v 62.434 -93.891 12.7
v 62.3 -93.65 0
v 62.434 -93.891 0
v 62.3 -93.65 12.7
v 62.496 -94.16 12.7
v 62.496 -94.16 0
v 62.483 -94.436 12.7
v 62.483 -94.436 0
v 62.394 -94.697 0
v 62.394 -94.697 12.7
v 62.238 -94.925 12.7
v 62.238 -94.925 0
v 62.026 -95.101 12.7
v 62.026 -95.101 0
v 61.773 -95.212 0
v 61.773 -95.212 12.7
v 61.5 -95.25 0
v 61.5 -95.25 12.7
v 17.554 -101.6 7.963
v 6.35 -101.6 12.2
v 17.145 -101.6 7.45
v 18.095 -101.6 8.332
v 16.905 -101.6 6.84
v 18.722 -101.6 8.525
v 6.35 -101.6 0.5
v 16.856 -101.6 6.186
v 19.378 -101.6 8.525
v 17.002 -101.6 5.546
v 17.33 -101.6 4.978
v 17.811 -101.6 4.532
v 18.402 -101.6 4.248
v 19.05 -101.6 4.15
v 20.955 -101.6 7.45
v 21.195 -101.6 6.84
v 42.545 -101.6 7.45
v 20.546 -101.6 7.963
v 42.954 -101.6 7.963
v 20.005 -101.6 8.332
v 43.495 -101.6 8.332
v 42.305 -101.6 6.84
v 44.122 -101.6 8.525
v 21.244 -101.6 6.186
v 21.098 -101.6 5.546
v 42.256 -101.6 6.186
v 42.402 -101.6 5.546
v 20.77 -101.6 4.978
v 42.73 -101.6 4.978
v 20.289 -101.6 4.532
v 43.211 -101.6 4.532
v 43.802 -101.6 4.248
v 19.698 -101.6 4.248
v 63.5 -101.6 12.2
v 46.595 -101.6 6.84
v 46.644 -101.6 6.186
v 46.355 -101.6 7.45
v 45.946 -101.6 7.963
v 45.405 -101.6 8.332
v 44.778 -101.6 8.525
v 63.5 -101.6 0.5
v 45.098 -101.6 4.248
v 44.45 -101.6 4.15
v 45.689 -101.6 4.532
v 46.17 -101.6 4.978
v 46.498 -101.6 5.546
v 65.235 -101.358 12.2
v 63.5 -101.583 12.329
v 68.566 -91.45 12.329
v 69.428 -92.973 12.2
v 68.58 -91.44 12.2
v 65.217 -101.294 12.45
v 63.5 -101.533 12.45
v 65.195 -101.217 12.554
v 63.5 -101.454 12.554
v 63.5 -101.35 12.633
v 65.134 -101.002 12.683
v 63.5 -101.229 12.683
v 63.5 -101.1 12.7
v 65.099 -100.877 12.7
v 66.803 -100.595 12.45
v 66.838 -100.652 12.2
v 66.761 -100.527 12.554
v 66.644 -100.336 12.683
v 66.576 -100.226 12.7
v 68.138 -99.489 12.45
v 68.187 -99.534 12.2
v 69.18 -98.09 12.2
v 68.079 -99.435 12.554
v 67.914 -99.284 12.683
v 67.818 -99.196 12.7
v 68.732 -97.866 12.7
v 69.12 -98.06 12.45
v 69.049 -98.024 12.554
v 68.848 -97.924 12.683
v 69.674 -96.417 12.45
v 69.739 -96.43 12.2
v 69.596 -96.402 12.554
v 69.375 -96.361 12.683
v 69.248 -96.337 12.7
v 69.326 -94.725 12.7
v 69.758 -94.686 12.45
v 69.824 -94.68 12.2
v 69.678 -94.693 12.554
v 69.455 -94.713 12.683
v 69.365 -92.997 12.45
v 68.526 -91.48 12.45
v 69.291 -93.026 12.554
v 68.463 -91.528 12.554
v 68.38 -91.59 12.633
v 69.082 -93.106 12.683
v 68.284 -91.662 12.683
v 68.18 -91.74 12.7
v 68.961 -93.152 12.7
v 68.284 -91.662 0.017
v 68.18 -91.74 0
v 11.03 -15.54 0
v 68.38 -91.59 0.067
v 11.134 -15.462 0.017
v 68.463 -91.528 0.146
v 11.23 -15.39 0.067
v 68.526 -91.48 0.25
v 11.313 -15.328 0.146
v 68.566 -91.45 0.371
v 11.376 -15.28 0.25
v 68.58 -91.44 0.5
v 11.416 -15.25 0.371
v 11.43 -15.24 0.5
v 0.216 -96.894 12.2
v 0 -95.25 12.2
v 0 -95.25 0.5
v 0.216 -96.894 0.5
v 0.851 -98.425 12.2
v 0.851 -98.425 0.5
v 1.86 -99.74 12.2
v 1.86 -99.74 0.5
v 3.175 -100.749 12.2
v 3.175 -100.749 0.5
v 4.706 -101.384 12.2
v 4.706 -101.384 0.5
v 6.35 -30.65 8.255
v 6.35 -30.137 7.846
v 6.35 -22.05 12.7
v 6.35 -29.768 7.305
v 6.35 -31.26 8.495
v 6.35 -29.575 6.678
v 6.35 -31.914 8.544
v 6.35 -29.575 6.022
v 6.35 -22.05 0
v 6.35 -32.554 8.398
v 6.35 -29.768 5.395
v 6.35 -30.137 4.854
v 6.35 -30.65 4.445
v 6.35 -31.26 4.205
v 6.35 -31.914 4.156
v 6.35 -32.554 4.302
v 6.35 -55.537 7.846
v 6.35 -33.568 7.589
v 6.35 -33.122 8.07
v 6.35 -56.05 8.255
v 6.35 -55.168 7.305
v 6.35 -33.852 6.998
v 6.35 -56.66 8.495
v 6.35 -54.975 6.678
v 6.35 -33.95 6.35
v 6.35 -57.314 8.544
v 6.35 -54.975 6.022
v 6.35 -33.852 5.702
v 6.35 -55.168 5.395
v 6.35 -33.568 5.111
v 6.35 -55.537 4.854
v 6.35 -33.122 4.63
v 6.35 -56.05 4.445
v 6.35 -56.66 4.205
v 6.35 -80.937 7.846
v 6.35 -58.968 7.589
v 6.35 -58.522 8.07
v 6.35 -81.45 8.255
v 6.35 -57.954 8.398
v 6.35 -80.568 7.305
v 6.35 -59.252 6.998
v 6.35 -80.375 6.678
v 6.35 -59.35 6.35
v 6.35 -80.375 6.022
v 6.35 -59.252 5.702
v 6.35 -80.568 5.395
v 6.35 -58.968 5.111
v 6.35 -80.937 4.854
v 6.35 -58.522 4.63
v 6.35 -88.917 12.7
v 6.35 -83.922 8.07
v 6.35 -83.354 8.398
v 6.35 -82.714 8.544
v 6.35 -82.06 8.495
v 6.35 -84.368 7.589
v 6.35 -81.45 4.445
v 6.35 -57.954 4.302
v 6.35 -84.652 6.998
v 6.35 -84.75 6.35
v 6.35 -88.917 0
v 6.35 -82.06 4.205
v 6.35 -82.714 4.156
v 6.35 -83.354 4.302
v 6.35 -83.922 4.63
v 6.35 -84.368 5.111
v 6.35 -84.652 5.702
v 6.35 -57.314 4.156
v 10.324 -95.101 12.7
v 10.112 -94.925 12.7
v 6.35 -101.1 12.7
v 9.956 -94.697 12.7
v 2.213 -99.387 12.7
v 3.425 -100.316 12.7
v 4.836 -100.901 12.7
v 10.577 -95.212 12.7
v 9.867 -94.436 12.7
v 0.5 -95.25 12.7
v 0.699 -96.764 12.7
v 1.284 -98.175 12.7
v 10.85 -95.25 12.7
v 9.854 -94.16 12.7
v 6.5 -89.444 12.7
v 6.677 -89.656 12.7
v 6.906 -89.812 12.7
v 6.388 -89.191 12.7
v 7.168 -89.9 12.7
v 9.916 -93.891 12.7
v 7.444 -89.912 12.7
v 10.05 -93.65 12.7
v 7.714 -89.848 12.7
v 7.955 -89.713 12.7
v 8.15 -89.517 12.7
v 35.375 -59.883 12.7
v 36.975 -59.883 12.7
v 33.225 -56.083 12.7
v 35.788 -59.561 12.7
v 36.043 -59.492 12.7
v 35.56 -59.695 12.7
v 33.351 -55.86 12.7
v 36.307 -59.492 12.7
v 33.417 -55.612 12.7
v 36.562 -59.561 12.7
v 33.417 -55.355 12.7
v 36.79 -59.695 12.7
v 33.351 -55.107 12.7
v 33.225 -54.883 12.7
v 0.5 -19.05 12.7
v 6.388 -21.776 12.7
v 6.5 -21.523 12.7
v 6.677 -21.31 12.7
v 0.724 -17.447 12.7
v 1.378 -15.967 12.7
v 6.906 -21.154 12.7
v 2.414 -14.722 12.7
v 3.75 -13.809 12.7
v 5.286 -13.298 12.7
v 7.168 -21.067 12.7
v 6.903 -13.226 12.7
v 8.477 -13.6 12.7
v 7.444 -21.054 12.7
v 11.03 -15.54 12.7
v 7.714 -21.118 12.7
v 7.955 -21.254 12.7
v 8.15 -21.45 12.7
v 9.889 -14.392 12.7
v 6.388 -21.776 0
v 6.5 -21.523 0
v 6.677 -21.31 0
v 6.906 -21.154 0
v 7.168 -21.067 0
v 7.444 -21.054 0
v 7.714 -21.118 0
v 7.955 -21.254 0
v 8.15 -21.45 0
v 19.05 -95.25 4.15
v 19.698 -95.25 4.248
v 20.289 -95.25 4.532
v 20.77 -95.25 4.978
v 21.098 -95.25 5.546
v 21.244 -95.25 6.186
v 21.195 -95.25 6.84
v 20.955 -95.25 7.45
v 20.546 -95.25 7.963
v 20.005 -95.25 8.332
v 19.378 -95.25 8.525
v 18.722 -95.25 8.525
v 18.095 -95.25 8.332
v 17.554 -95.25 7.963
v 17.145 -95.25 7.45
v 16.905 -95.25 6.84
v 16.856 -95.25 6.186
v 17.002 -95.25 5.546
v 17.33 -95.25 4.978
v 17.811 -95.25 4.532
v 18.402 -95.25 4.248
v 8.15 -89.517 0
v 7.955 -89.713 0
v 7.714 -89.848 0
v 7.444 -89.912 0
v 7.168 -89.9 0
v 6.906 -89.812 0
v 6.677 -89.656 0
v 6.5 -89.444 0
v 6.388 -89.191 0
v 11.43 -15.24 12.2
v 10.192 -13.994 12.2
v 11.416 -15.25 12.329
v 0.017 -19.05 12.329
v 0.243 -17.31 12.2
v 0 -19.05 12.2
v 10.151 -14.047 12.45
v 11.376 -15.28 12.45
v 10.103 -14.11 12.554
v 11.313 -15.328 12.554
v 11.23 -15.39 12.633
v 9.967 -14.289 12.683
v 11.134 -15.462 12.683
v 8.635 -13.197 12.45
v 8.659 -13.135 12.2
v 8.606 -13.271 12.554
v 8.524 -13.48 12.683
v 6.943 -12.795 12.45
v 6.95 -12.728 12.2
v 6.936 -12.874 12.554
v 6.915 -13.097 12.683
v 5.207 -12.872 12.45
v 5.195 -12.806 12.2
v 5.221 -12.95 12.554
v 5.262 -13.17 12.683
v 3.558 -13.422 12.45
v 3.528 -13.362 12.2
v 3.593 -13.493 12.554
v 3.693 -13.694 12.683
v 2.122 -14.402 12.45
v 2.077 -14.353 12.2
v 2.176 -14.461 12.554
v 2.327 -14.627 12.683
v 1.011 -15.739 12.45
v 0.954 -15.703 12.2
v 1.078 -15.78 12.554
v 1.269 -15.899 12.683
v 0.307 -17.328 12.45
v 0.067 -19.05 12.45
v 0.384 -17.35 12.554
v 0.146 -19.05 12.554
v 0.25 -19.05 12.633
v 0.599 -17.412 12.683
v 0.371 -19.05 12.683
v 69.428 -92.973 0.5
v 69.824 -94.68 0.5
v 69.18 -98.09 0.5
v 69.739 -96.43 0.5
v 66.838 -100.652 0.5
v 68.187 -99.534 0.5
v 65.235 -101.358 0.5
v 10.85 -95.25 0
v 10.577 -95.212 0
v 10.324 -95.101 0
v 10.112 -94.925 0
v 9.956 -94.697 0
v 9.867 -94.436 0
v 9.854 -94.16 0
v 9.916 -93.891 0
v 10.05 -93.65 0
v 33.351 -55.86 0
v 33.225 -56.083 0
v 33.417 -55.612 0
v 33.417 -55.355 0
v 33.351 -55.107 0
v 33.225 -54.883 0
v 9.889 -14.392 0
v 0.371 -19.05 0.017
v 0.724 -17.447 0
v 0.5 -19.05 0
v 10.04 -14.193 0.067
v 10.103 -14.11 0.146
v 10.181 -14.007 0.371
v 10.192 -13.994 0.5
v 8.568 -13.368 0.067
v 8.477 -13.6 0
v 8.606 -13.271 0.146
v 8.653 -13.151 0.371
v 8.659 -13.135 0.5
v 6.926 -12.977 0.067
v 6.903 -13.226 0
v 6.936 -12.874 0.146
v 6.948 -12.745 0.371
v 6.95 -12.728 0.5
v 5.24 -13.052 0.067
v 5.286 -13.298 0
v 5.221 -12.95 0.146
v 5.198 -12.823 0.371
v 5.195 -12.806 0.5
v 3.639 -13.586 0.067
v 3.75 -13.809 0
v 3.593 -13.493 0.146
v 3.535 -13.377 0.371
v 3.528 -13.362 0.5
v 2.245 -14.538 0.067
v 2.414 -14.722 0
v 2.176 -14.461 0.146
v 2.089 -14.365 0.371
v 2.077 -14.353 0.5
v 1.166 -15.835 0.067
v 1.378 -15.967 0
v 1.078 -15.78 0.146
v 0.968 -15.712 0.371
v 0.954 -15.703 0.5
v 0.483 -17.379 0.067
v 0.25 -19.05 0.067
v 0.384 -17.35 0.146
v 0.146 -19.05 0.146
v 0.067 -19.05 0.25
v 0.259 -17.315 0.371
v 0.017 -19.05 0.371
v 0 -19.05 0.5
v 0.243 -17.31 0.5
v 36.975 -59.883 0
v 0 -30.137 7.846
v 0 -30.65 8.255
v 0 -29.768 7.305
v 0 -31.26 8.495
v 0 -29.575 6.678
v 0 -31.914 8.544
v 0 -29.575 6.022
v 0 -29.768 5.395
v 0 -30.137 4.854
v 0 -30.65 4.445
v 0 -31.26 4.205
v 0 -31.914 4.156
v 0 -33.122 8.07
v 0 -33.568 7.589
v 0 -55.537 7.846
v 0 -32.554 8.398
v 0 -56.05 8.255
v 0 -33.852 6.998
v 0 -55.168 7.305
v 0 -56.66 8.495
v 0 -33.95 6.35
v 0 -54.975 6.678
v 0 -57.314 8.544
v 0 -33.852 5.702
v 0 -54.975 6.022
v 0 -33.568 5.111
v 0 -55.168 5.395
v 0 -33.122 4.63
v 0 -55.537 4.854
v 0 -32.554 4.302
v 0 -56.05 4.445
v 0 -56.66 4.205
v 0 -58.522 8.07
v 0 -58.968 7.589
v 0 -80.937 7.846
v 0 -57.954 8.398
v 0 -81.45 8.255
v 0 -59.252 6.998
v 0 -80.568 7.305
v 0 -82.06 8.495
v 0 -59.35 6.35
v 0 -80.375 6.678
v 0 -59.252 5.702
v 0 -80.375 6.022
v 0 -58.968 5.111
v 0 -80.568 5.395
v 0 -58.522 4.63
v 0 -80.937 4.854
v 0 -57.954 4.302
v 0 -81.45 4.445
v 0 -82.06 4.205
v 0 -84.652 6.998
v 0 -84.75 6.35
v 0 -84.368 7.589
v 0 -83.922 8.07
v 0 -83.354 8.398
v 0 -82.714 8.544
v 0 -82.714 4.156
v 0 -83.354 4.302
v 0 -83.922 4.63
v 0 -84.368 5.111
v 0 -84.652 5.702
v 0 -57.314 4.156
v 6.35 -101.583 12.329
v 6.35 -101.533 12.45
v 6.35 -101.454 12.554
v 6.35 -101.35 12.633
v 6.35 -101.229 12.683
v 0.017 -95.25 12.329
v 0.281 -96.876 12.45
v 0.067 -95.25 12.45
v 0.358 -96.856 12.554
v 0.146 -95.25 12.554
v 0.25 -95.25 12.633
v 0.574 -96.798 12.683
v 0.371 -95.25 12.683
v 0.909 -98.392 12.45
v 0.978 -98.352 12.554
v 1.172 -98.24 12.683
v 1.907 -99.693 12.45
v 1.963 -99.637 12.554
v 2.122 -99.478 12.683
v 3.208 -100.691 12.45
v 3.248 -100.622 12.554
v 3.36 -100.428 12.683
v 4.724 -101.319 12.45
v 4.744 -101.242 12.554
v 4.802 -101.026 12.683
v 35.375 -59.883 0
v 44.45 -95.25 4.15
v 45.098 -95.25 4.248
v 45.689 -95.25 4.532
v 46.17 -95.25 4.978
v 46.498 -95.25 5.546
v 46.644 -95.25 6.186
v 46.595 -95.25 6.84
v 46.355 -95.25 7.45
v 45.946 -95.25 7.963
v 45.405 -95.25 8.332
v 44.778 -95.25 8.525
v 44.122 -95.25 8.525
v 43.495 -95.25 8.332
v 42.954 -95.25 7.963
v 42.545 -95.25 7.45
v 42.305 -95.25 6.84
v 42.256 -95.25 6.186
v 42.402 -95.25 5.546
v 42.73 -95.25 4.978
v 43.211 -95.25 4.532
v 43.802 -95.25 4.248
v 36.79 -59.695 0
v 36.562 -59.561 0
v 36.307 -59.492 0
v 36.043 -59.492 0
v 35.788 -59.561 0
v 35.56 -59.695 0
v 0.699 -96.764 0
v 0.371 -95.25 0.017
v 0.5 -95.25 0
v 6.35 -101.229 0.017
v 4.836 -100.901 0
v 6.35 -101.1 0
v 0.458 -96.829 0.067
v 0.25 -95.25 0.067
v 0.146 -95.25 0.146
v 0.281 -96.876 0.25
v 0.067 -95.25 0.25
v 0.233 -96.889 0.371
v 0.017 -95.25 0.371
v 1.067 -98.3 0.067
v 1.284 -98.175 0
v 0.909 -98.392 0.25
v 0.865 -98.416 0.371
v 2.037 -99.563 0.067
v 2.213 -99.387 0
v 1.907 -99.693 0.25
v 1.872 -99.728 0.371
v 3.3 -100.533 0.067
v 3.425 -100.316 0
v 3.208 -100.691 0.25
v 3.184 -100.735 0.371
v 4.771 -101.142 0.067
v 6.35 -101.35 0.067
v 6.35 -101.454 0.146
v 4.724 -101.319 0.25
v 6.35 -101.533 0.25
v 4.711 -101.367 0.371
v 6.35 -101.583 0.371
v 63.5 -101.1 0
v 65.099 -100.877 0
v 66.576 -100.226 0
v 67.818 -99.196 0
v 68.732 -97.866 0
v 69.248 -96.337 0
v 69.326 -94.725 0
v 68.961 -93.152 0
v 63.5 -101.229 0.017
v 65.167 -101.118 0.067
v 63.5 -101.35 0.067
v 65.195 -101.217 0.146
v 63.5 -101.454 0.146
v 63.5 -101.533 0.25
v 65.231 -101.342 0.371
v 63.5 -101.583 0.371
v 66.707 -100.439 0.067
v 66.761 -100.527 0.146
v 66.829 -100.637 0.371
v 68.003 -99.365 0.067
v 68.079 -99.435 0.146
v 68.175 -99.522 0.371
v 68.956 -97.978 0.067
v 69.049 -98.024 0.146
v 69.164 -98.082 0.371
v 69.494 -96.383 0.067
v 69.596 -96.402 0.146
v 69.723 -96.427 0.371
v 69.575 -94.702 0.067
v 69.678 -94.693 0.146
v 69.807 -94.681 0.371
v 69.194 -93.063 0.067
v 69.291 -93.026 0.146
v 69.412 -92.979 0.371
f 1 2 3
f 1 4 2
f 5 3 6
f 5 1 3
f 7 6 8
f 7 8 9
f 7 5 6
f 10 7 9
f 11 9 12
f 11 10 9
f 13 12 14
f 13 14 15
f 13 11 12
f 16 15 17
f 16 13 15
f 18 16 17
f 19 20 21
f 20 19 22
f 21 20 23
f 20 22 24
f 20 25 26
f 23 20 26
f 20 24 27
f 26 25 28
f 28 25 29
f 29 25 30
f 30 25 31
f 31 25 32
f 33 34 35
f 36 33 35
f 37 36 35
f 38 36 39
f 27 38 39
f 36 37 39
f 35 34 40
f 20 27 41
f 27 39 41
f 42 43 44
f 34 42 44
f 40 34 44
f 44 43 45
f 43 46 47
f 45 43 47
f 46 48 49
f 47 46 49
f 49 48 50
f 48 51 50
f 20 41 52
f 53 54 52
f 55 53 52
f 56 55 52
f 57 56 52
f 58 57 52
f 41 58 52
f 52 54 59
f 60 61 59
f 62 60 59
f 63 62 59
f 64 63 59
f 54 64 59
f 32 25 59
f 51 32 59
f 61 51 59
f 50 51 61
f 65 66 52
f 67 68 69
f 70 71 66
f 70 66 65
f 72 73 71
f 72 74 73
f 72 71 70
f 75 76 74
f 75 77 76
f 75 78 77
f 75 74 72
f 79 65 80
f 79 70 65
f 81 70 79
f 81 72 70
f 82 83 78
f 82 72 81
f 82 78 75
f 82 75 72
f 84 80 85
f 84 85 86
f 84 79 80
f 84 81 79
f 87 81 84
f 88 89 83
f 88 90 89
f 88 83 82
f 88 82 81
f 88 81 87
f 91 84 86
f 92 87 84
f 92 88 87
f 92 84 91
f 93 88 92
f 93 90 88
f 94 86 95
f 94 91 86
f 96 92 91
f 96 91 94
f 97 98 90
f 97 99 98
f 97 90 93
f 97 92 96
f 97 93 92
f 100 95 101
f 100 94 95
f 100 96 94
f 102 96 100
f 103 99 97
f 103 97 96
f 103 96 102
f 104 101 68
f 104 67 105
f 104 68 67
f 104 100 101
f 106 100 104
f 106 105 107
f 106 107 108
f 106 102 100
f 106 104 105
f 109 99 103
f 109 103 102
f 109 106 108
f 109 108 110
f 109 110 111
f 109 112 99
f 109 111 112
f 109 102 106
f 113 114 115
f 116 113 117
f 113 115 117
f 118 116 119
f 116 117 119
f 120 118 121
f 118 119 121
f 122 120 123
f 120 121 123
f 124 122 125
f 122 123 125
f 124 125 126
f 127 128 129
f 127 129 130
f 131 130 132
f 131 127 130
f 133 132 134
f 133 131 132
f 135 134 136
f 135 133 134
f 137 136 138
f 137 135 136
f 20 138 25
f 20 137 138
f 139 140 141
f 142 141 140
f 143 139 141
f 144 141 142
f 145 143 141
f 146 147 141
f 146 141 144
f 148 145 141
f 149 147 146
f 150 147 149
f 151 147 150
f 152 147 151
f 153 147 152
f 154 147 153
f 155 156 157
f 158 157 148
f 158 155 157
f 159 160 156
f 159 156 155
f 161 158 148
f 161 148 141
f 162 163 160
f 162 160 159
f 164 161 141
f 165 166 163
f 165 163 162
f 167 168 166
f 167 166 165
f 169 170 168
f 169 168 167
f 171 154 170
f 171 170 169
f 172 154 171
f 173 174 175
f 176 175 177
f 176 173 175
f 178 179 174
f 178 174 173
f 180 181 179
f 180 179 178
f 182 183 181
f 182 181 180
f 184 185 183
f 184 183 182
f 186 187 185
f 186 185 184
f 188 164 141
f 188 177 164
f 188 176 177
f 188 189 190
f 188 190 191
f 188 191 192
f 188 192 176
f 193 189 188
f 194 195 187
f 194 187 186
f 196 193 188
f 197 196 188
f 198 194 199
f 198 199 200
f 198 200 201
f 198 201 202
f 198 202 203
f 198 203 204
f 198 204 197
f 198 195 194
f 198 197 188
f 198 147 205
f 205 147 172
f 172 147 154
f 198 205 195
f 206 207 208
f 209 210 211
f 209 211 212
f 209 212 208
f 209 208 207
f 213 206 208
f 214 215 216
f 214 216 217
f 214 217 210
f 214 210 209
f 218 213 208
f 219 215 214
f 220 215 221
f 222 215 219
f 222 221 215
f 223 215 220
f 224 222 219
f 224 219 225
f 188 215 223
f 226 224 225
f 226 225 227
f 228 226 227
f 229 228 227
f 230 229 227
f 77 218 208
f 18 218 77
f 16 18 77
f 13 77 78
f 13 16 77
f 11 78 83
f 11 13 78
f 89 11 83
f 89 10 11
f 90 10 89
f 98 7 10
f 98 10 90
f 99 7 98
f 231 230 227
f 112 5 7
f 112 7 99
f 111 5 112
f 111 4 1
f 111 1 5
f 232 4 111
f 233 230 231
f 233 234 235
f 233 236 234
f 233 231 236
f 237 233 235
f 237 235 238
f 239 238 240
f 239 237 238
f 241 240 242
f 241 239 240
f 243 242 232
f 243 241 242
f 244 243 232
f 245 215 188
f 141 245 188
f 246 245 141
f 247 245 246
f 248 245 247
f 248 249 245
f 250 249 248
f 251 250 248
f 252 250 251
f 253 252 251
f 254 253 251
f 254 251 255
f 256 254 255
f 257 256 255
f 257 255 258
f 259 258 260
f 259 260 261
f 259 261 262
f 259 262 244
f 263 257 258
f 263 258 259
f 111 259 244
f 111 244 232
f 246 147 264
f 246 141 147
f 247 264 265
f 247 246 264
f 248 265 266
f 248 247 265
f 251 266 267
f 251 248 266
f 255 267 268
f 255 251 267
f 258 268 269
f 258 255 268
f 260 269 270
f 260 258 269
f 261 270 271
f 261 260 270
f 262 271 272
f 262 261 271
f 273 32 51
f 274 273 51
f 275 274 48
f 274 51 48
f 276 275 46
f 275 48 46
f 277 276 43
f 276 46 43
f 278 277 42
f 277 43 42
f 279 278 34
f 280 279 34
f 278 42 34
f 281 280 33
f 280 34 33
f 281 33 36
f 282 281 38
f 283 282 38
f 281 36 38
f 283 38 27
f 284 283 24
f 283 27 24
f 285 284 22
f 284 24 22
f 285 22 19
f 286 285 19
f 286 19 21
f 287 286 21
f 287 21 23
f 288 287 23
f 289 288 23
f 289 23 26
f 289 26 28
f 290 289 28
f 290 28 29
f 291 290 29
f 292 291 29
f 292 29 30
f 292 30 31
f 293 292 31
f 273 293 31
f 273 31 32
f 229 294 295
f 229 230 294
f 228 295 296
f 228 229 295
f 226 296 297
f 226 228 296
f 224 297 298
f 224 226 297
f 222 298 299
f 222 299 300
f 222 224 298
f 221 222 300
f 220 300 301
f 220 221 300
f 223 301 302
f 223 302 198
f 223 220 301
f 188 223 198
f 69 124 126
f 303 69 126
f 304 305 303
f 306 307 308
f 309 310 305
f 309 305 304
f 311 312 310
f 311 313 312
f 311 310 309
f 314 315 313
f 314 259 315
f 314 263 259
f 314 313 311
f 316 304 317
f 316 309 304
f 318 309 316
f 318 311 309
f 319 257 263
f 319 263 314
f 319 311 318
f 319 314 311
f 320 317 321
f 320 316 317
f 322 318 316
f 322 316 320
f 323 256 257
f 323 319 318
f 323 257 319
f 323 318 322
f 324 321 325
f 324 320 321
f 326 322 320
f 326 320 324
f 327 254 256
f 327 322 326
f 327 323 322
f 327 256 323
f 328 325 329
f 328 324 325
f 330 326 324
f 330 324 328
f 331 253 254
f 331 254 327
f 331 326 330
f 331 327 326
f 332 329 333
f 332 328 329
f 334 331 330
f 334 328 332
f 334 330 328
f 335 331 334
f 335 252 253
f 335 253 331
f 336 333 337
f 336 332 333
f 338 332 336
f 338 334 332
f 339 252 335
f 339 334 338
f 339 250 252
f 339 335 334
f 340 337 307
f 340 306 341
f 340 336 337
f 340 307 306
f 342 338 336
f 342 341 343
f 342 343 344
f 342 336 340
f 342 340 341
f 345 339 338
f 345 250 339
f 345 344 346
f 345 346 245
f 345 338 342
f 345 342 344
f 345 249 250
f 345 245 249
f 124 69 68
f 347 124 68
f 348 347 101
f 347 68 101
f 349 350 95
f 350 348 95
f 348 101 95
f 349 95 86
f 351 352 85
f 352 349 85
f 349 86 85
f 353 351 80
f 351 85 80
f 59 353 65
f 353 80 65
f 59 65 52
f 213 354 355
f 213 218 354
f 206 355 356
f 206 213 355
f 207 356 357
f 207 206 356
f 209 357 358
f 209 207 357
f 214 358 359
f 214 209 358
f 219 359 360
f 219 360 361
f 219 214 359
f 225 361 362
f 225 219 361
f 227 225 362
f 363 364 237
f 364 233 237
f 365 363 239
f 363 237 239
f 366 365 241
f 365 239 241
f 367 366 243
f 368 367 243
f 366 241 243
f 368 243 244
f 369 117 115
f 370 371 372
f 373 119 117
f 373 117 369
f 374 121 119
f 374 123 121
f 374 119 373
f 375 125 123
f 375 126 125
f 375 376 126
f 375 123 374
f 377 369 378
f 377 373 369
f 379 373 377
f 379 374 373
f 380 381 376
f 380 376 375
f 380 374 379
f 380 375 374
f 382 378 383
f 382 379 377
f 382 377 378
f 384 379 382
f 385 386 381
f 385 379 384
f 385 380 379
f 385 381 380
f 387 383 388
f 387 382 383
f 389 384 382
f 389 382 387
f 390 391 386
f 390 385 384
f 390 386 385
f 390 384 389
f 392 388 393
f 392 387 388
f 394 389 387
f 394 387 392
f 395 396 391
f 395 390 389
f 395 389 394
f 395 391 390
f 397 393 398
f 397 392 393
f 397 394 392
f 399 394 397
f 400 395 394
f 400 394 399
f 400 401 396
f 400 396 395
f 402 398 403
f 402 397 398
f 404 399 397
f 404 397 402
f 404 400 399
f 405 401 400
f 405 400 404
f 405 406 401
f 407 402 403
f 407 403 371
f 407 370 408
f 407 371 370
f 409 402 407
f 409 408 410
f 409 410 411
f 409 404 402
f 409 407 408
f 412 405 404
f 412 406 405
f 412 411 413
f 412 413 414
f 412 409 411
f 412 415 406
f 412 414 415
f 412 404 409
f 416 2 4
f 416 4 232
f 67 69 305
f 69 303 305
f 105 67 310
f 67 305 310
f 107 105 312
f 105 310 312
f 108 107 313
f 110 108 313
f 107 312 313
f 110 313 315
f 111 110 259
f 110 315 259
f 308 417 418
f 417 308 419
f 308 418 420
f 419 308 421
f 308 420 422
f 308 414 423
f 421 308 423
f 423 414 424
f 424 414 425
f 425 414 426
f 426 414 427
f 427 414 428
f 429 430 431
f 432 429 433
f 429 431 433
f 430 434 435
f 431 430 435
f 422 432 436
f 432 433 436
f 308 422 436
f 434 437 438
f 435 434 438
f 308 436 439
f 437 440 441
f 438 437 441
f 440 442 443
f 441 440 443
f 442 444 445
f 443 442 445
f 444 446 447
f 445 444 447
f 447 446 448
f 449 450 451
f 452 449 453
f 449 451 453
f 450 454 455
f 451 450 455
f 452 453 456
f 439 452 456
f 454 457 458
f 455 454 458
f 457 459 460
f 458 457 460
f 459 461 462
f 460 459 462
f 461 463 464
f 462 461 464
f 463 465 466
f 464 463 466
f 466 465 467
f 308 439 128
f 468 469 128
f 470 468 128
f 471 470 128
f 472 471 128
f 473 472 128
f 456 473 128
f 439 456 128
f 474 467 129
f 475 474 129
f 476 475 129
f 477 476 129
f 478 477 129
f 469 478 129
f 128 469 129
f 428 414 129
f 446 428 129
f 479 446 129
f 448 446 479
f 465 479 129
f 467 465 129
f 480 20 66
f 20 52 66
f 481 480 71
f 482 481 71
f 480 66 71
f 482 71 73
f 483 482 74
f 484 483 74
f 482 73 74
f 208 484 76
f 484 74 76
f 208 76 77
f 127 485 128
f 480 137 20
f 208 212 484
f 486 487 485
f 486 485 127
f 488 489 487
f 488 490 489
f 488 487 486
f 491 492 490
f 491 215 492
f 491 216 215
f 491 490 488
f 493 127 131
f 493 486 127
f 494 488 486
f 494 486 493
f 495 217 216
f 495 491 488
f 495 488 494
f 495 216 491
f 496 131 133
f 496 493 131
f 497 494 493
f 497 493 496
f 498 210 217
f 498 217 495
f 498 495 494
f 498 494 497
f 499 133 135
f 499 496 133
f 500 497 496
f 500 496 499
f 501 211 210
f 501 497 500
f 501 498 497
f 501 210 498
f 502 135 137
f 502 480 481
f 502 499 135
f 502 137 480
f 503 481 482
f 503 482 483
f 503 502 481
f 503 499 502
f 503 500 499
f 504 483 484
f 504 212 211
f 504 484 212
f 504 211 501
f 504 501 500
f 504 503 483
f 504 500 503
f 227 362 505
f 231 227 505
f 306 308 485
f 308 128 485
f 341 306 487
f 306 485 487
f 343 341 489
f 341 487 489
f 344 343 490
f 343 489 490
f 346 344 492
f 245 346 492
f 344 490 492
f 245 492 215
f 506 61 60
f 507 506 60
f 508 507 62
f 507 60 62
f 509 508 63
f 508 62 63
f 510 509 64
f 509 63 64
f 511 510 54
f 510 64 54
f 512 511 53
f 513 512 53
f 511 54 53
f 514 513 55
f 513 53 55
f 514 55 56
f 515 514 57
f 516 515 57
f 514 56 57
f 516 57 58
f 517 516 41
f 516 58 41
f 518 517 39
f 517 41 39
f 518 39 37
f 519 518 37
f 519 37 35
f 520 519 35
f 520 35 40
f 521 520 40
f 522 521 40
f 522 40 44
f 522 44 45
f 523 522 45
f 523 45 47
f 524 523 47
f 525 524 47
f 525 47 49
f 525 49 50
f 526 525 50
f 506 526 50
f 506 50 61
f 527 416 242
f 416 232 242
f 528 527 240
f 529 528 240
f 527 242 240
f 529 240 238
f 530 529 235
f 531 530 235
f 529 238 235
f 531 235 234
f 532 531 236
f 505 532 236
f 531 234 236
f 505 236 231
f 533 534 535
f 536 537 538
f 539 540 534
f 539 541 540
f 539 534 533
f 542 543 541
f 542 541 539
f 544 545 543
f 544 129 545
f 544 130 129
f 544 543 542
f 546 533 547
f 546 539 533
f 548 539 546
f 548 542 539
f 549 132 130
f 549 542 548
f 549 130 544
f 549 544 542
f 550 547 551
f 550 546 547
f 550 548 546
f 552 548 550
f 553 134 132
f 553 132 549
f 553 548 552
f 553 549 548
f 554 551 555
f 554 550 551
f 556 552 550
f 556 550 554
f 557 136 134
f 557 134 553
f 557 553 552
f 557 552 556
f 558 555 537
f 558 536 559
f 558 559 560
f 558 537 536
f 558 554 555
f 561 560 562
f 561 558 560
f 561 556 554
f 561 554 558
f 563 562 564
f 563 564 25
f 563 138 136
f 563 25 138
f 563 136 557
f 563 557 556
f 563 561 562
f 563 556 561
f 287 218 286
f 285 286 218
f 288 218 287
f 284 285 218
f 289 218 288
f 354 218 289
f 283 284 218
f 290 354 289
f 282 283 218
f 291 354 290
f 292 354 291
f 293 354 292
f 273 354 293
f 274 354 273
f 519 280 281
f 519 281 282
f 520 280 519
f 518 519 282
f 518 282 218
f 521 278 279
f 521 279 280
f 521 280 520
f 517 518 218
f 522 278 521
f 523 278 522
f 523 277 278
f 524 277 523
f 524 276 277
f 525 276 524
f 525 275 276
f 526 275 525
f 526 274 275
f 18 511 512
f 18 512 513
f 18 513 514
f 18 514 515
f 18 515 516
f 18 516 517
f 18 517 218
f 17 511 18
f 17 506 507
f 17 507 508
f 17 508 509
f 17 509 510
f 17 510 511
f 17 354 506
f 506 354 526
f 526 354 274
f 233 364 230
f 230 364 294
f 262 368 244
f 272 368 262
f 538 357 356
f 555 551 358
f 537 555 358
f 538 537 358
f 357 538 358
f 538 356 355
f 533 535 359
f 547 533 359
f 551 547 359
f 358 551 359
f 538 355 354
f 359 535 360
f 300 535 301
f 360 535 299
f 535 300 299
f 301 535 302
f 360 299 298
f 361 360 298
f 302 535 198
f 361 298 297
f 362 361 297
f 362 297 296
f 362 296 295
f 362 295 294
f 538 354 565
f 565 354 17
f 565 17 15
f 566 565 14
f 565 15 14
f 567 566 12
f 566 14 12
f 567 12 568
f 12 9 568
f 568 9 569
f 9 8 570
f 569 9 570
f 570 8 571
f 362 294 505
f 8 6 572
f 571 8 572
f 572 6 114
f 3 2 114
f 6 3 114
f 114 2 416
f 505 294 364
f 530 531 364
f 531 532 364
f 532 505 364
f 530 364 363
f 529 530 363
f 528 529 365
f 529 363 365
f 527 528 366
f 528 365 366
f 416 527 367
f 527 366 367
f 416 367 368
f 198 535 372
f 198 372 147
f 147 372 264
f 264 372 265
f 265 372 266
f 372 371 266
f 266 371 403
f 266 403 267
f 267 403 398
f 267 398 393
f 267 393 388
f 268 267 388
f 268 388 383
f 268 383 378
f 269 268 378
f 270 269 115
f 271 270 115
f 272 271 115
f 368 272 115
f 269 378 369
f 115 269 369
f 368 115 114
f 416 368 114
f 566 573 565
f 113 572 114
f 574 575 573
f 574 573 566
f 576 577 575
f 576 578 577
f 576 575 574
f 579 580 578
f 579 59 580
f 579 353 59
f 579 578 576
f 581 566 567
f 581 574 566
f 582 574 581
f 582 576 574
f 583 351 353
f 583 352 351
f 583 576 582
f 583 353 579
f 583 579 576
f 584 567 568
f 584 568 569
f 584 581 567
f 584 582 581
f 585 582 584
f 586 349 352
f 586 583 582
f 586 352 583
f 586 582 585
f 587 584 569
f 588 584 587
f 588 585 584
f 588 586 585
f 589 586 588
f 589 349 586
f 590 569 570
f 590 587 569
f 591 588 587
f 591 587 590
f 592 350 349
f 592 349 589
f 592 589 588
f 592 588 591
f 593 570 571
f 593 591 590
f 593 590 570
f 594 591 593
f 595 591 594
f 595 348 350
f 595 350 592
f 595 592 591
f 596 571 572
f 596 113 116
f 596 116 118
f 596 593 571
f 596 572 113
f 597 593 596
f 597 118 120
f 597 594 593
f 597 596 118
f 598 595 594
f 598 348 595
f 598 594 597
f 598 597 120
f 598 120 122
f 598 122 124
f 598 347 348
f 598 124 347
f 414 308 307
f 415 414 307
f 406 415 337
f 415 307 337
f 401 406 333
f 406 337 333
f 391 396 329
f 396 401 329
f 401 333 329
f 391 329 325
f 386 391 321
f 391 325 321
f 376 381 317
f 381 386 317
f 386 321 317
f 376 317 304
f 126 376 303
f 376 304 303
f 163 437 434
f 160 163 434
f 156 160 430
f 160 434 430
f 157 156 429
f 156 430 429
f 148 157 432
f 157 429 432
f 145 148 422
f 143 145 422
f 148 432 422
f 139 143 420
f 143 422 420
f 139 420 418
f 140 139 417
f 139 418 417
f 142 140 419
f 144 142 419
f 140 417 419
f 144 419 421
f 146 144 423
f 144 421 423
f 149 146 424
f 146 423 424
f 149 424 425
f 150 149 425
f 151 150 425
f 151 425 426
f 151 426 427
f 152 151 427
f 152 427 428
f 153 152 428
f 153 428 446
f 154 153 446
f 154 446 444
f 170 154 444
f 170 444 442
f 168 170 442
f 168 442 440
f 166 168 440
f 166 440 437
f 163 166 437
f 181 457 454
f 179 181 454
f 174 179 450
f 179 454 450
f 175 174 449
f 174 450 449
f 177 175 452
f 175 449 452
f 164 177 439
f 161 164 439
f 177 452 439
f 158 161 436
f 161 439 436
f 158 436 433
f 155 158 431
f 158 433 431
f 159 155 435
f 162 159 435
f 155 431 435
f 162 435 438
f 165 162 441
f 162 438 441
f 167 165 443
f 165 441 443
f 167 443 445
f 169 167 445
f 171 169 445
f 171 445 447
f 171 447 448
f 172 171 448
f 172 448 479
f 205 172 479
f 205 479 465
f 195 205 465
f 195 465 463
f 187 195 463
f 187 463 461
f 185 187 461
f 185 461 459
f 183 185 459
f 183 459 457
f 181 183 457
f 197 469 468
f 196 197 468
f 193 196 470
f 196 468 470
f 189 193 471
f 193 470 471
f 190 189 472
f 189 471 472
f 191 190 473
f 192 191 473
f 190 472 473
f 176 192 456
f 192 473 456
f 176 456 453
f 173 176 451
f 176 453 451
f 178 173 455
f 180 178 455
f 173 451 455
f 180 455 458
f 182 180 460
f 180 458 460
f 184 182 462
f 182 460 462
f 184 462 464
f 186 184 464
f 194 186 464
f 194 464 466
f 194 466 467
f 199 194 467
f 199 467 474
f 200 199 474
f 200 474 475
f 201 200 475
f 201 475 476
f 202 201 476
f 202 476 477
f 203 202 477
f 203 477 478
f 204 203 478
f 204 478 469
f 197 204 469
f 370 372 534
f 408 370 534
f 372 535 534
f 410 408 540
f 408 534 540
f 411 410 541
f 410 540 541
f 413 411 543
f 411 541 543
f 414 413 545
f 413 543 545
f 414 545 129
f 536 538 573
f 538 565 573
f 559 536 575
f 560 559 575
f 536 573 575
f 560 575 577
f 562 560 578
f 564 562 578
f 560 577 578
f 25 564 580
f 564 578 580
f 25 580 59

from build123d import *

# Parameters (mm, degrees)
BOSS_EXTRUDE1_DEPTH = 12.7
FILLET1_R           = 6.35
FILLET2_R           = 1
CUT_EXTRUDE1_REACH  = 115.77
SKETCH2_R           = 2.2
CUT_EXTRUDE2_REACH  = 125.947
SKETCH3_R           = 2.2
FILLET3_R           = 0.5


with BuildPart() as part:
    # Sketch1 → Boss-Extrude1 (new body)
    # profile 1 of 3: a face of its own
    with BuildSketch(Plane.XY):
        Polygon((0, 0), (0, -101.6), (76.2, -101.6), align=None)
        Polygon((63.5, -95.25), (6.35, -19.05), (6.35, -95.25), align=None, mode=Mode.SUBTRACT)
    # profile 2 of 3: a face of its own
    with BuildSketch(Plane.XY):
        Polygon((34.925, -57.15), (6.35, -95.25), (8.85, -95.25), (36.175, -58.816666667), align=None)
    # profile 3 of 3: a face of its own
    with BuildSketch(Plane.XY):
        Polygon((33.675, -55.483333333), (6.35, -91.916666667), (6.35, -95.25), (34.925, -57.15), align=None)
    extrude(amount=BOSS_EXTRUDE1_DEPTH)

    # Fillet1
    fillet1_edges = [part.edges().sort_by_distance(p)[0] for p in [
        (0, 0, 6.35),
        (76.2, -101.6, 6.35),
        (0, -101.6, 6.35),
    ]]
    fillet(fillet1_edges, radius=FILLET1_R)

    # Fillet2
    fillet2_edges = [part.edges().sort_by_distance(p)[0] for p in [
        (36.175, -58.816666667, 6.35),
        (8.85, -95.25, 6.35),
        (63.5, -95.25, 6.35),
        (6.35, -19.05, 6.35),
        (6.35, -91.916666667, 6.35),
        (33.675, -55.483333333, 6.35),
    ]]
    fillet(fillet2_edges, radius=FILLET2_R)

    # Sketch2 → Cut-Extrude1 (cut, up to next)
    with BuildSketch(Plane.XZ.offset(101.6), mode=Mode.PRIVATE) as cut_extrude1_sk1:
        with Locations(Location((19.05, 6.35, 0), (0, 0, 270))):
            Circle(SKETCH2_R)
    cut_extrude1_tool1 = extrude(cut_extrude1_sk1.sketch, amount=-CUT_EXTRUDE1_REACH, mode=Mode.PRIVATE) & part.part
    # Sketch2 → Cut-Extrude1 (cut, up to next)
    with BuildSketch(Plane.XZ.offset(101.6), mode=Mode.PRIVATE) as cut_extrude1_sk2:
        with Locations(Location((44.45, 6.35, 0), (0, 0, 270))):
            Circle(SKETCH2_R)
    cut_extrude1_tool2 = extrude(cut_extrude1_sk2.sketch, amount=-CUT_EXTRUDE1_REACH, mode=Mode.PRIVATE) & part.part
    add(cut_extrude1_tool1.solids().sort_by_distance((19.05, -101.6, 6.35))[0], mode=Mode.SUBTRACT)
    add(cut_extrude1_tool2.solids().sort_by_distance((44.45, -101.6, 6.35))[0], mode=Mode.SUBTRACT)

    # Sketch3 → Cut-Extrude2 (cut, up to next)
    with BuildSketch(Plane.ZY, mode=Mode.PRIVATE) as cut_extrude2_sk1:
        with Locations(Location((6.35, -82.55, 0), (0, 0, 270))):
            Circle(SKETCH3_R)
    cut_extrude2_tool1 = extrude(cut_extrude2_sk1.sketch, amount=-CUT_EXTRUDE2_REACH, mode=Mode.PRIVATE) & part.part
    # Sketch3 → Cut-Extrude2 (cut, up to next)
    with BuildSketch(Plane.ZY, mode=Mode.PRIVATE) as cut_extrude2_sk2:
        with Locations(Location((6.35, -57.15, 0), (0, 0, 270))):
            Circle(SKETCH3_R)
    cut_extrude2_tool2 = extrude(cut_extrude2_sk2.sketch, amount=-CUT_EXTRUDE2_REACH, mode=Mode.PRIVATE) & part.part
    # Sketch3 → Cut-Extrude2 (cut, up to next)
    with BuildSketch(Plane.ZY, mode=Mode.PRIVATE) as cut_extrude2_sk3:
        with Locations(Location((6.35, -31.75, 0), (0, 0, 270))):
            Circle(SKETCH3_R)
    cut_extrude2_tool3 = extrude(cut_extrude2_sk3.sketch, amount=-CUT_EXTRUDE2_REACH, mode=Mode.PRIVATE) & part.part
    add(cut_extrude2_tool1.solids().sort_by_distance((0, -82.55, 6.35))[0], mode=Mode.SUBTRACT)
    add(cut_extrude2_tool2.solids().sort_by_distance((0, -57.15, 6.35))[0], mode=Mode.SUBTRACT)
    add(cut_extrude2_tool3.solids().sort_by_distance((0, -31.75, 6.35))[0], mode=Mode.SUBTRACT)

    # Fillet3
    fillet3_edges = [part.edges().sort_by_distance(p)[0] for p in [
        (34.925, -101.6, 0),
        (34.925, -101.6, 12.7),
        (0, -57.15, 0),
        (40.005, -53.34, 0),
        (69.179612663, -98.089806331, 0),
        (4.341953686, -13.025861057, 0),
        (1.859871939, -99.740128061, 0),
        (0, -57.15, 12.7),
        (40.005, -53.34, 12.7),
        (69.179612663, -98.089806331, 12.7),
        (4.341953686, -13.025861057, 12.7),
        (1.859871939, -99.740128061, 12.7),
    ]]
    fillet(fillet3_edges, radius=FILLET3_R)


solid = part.part
